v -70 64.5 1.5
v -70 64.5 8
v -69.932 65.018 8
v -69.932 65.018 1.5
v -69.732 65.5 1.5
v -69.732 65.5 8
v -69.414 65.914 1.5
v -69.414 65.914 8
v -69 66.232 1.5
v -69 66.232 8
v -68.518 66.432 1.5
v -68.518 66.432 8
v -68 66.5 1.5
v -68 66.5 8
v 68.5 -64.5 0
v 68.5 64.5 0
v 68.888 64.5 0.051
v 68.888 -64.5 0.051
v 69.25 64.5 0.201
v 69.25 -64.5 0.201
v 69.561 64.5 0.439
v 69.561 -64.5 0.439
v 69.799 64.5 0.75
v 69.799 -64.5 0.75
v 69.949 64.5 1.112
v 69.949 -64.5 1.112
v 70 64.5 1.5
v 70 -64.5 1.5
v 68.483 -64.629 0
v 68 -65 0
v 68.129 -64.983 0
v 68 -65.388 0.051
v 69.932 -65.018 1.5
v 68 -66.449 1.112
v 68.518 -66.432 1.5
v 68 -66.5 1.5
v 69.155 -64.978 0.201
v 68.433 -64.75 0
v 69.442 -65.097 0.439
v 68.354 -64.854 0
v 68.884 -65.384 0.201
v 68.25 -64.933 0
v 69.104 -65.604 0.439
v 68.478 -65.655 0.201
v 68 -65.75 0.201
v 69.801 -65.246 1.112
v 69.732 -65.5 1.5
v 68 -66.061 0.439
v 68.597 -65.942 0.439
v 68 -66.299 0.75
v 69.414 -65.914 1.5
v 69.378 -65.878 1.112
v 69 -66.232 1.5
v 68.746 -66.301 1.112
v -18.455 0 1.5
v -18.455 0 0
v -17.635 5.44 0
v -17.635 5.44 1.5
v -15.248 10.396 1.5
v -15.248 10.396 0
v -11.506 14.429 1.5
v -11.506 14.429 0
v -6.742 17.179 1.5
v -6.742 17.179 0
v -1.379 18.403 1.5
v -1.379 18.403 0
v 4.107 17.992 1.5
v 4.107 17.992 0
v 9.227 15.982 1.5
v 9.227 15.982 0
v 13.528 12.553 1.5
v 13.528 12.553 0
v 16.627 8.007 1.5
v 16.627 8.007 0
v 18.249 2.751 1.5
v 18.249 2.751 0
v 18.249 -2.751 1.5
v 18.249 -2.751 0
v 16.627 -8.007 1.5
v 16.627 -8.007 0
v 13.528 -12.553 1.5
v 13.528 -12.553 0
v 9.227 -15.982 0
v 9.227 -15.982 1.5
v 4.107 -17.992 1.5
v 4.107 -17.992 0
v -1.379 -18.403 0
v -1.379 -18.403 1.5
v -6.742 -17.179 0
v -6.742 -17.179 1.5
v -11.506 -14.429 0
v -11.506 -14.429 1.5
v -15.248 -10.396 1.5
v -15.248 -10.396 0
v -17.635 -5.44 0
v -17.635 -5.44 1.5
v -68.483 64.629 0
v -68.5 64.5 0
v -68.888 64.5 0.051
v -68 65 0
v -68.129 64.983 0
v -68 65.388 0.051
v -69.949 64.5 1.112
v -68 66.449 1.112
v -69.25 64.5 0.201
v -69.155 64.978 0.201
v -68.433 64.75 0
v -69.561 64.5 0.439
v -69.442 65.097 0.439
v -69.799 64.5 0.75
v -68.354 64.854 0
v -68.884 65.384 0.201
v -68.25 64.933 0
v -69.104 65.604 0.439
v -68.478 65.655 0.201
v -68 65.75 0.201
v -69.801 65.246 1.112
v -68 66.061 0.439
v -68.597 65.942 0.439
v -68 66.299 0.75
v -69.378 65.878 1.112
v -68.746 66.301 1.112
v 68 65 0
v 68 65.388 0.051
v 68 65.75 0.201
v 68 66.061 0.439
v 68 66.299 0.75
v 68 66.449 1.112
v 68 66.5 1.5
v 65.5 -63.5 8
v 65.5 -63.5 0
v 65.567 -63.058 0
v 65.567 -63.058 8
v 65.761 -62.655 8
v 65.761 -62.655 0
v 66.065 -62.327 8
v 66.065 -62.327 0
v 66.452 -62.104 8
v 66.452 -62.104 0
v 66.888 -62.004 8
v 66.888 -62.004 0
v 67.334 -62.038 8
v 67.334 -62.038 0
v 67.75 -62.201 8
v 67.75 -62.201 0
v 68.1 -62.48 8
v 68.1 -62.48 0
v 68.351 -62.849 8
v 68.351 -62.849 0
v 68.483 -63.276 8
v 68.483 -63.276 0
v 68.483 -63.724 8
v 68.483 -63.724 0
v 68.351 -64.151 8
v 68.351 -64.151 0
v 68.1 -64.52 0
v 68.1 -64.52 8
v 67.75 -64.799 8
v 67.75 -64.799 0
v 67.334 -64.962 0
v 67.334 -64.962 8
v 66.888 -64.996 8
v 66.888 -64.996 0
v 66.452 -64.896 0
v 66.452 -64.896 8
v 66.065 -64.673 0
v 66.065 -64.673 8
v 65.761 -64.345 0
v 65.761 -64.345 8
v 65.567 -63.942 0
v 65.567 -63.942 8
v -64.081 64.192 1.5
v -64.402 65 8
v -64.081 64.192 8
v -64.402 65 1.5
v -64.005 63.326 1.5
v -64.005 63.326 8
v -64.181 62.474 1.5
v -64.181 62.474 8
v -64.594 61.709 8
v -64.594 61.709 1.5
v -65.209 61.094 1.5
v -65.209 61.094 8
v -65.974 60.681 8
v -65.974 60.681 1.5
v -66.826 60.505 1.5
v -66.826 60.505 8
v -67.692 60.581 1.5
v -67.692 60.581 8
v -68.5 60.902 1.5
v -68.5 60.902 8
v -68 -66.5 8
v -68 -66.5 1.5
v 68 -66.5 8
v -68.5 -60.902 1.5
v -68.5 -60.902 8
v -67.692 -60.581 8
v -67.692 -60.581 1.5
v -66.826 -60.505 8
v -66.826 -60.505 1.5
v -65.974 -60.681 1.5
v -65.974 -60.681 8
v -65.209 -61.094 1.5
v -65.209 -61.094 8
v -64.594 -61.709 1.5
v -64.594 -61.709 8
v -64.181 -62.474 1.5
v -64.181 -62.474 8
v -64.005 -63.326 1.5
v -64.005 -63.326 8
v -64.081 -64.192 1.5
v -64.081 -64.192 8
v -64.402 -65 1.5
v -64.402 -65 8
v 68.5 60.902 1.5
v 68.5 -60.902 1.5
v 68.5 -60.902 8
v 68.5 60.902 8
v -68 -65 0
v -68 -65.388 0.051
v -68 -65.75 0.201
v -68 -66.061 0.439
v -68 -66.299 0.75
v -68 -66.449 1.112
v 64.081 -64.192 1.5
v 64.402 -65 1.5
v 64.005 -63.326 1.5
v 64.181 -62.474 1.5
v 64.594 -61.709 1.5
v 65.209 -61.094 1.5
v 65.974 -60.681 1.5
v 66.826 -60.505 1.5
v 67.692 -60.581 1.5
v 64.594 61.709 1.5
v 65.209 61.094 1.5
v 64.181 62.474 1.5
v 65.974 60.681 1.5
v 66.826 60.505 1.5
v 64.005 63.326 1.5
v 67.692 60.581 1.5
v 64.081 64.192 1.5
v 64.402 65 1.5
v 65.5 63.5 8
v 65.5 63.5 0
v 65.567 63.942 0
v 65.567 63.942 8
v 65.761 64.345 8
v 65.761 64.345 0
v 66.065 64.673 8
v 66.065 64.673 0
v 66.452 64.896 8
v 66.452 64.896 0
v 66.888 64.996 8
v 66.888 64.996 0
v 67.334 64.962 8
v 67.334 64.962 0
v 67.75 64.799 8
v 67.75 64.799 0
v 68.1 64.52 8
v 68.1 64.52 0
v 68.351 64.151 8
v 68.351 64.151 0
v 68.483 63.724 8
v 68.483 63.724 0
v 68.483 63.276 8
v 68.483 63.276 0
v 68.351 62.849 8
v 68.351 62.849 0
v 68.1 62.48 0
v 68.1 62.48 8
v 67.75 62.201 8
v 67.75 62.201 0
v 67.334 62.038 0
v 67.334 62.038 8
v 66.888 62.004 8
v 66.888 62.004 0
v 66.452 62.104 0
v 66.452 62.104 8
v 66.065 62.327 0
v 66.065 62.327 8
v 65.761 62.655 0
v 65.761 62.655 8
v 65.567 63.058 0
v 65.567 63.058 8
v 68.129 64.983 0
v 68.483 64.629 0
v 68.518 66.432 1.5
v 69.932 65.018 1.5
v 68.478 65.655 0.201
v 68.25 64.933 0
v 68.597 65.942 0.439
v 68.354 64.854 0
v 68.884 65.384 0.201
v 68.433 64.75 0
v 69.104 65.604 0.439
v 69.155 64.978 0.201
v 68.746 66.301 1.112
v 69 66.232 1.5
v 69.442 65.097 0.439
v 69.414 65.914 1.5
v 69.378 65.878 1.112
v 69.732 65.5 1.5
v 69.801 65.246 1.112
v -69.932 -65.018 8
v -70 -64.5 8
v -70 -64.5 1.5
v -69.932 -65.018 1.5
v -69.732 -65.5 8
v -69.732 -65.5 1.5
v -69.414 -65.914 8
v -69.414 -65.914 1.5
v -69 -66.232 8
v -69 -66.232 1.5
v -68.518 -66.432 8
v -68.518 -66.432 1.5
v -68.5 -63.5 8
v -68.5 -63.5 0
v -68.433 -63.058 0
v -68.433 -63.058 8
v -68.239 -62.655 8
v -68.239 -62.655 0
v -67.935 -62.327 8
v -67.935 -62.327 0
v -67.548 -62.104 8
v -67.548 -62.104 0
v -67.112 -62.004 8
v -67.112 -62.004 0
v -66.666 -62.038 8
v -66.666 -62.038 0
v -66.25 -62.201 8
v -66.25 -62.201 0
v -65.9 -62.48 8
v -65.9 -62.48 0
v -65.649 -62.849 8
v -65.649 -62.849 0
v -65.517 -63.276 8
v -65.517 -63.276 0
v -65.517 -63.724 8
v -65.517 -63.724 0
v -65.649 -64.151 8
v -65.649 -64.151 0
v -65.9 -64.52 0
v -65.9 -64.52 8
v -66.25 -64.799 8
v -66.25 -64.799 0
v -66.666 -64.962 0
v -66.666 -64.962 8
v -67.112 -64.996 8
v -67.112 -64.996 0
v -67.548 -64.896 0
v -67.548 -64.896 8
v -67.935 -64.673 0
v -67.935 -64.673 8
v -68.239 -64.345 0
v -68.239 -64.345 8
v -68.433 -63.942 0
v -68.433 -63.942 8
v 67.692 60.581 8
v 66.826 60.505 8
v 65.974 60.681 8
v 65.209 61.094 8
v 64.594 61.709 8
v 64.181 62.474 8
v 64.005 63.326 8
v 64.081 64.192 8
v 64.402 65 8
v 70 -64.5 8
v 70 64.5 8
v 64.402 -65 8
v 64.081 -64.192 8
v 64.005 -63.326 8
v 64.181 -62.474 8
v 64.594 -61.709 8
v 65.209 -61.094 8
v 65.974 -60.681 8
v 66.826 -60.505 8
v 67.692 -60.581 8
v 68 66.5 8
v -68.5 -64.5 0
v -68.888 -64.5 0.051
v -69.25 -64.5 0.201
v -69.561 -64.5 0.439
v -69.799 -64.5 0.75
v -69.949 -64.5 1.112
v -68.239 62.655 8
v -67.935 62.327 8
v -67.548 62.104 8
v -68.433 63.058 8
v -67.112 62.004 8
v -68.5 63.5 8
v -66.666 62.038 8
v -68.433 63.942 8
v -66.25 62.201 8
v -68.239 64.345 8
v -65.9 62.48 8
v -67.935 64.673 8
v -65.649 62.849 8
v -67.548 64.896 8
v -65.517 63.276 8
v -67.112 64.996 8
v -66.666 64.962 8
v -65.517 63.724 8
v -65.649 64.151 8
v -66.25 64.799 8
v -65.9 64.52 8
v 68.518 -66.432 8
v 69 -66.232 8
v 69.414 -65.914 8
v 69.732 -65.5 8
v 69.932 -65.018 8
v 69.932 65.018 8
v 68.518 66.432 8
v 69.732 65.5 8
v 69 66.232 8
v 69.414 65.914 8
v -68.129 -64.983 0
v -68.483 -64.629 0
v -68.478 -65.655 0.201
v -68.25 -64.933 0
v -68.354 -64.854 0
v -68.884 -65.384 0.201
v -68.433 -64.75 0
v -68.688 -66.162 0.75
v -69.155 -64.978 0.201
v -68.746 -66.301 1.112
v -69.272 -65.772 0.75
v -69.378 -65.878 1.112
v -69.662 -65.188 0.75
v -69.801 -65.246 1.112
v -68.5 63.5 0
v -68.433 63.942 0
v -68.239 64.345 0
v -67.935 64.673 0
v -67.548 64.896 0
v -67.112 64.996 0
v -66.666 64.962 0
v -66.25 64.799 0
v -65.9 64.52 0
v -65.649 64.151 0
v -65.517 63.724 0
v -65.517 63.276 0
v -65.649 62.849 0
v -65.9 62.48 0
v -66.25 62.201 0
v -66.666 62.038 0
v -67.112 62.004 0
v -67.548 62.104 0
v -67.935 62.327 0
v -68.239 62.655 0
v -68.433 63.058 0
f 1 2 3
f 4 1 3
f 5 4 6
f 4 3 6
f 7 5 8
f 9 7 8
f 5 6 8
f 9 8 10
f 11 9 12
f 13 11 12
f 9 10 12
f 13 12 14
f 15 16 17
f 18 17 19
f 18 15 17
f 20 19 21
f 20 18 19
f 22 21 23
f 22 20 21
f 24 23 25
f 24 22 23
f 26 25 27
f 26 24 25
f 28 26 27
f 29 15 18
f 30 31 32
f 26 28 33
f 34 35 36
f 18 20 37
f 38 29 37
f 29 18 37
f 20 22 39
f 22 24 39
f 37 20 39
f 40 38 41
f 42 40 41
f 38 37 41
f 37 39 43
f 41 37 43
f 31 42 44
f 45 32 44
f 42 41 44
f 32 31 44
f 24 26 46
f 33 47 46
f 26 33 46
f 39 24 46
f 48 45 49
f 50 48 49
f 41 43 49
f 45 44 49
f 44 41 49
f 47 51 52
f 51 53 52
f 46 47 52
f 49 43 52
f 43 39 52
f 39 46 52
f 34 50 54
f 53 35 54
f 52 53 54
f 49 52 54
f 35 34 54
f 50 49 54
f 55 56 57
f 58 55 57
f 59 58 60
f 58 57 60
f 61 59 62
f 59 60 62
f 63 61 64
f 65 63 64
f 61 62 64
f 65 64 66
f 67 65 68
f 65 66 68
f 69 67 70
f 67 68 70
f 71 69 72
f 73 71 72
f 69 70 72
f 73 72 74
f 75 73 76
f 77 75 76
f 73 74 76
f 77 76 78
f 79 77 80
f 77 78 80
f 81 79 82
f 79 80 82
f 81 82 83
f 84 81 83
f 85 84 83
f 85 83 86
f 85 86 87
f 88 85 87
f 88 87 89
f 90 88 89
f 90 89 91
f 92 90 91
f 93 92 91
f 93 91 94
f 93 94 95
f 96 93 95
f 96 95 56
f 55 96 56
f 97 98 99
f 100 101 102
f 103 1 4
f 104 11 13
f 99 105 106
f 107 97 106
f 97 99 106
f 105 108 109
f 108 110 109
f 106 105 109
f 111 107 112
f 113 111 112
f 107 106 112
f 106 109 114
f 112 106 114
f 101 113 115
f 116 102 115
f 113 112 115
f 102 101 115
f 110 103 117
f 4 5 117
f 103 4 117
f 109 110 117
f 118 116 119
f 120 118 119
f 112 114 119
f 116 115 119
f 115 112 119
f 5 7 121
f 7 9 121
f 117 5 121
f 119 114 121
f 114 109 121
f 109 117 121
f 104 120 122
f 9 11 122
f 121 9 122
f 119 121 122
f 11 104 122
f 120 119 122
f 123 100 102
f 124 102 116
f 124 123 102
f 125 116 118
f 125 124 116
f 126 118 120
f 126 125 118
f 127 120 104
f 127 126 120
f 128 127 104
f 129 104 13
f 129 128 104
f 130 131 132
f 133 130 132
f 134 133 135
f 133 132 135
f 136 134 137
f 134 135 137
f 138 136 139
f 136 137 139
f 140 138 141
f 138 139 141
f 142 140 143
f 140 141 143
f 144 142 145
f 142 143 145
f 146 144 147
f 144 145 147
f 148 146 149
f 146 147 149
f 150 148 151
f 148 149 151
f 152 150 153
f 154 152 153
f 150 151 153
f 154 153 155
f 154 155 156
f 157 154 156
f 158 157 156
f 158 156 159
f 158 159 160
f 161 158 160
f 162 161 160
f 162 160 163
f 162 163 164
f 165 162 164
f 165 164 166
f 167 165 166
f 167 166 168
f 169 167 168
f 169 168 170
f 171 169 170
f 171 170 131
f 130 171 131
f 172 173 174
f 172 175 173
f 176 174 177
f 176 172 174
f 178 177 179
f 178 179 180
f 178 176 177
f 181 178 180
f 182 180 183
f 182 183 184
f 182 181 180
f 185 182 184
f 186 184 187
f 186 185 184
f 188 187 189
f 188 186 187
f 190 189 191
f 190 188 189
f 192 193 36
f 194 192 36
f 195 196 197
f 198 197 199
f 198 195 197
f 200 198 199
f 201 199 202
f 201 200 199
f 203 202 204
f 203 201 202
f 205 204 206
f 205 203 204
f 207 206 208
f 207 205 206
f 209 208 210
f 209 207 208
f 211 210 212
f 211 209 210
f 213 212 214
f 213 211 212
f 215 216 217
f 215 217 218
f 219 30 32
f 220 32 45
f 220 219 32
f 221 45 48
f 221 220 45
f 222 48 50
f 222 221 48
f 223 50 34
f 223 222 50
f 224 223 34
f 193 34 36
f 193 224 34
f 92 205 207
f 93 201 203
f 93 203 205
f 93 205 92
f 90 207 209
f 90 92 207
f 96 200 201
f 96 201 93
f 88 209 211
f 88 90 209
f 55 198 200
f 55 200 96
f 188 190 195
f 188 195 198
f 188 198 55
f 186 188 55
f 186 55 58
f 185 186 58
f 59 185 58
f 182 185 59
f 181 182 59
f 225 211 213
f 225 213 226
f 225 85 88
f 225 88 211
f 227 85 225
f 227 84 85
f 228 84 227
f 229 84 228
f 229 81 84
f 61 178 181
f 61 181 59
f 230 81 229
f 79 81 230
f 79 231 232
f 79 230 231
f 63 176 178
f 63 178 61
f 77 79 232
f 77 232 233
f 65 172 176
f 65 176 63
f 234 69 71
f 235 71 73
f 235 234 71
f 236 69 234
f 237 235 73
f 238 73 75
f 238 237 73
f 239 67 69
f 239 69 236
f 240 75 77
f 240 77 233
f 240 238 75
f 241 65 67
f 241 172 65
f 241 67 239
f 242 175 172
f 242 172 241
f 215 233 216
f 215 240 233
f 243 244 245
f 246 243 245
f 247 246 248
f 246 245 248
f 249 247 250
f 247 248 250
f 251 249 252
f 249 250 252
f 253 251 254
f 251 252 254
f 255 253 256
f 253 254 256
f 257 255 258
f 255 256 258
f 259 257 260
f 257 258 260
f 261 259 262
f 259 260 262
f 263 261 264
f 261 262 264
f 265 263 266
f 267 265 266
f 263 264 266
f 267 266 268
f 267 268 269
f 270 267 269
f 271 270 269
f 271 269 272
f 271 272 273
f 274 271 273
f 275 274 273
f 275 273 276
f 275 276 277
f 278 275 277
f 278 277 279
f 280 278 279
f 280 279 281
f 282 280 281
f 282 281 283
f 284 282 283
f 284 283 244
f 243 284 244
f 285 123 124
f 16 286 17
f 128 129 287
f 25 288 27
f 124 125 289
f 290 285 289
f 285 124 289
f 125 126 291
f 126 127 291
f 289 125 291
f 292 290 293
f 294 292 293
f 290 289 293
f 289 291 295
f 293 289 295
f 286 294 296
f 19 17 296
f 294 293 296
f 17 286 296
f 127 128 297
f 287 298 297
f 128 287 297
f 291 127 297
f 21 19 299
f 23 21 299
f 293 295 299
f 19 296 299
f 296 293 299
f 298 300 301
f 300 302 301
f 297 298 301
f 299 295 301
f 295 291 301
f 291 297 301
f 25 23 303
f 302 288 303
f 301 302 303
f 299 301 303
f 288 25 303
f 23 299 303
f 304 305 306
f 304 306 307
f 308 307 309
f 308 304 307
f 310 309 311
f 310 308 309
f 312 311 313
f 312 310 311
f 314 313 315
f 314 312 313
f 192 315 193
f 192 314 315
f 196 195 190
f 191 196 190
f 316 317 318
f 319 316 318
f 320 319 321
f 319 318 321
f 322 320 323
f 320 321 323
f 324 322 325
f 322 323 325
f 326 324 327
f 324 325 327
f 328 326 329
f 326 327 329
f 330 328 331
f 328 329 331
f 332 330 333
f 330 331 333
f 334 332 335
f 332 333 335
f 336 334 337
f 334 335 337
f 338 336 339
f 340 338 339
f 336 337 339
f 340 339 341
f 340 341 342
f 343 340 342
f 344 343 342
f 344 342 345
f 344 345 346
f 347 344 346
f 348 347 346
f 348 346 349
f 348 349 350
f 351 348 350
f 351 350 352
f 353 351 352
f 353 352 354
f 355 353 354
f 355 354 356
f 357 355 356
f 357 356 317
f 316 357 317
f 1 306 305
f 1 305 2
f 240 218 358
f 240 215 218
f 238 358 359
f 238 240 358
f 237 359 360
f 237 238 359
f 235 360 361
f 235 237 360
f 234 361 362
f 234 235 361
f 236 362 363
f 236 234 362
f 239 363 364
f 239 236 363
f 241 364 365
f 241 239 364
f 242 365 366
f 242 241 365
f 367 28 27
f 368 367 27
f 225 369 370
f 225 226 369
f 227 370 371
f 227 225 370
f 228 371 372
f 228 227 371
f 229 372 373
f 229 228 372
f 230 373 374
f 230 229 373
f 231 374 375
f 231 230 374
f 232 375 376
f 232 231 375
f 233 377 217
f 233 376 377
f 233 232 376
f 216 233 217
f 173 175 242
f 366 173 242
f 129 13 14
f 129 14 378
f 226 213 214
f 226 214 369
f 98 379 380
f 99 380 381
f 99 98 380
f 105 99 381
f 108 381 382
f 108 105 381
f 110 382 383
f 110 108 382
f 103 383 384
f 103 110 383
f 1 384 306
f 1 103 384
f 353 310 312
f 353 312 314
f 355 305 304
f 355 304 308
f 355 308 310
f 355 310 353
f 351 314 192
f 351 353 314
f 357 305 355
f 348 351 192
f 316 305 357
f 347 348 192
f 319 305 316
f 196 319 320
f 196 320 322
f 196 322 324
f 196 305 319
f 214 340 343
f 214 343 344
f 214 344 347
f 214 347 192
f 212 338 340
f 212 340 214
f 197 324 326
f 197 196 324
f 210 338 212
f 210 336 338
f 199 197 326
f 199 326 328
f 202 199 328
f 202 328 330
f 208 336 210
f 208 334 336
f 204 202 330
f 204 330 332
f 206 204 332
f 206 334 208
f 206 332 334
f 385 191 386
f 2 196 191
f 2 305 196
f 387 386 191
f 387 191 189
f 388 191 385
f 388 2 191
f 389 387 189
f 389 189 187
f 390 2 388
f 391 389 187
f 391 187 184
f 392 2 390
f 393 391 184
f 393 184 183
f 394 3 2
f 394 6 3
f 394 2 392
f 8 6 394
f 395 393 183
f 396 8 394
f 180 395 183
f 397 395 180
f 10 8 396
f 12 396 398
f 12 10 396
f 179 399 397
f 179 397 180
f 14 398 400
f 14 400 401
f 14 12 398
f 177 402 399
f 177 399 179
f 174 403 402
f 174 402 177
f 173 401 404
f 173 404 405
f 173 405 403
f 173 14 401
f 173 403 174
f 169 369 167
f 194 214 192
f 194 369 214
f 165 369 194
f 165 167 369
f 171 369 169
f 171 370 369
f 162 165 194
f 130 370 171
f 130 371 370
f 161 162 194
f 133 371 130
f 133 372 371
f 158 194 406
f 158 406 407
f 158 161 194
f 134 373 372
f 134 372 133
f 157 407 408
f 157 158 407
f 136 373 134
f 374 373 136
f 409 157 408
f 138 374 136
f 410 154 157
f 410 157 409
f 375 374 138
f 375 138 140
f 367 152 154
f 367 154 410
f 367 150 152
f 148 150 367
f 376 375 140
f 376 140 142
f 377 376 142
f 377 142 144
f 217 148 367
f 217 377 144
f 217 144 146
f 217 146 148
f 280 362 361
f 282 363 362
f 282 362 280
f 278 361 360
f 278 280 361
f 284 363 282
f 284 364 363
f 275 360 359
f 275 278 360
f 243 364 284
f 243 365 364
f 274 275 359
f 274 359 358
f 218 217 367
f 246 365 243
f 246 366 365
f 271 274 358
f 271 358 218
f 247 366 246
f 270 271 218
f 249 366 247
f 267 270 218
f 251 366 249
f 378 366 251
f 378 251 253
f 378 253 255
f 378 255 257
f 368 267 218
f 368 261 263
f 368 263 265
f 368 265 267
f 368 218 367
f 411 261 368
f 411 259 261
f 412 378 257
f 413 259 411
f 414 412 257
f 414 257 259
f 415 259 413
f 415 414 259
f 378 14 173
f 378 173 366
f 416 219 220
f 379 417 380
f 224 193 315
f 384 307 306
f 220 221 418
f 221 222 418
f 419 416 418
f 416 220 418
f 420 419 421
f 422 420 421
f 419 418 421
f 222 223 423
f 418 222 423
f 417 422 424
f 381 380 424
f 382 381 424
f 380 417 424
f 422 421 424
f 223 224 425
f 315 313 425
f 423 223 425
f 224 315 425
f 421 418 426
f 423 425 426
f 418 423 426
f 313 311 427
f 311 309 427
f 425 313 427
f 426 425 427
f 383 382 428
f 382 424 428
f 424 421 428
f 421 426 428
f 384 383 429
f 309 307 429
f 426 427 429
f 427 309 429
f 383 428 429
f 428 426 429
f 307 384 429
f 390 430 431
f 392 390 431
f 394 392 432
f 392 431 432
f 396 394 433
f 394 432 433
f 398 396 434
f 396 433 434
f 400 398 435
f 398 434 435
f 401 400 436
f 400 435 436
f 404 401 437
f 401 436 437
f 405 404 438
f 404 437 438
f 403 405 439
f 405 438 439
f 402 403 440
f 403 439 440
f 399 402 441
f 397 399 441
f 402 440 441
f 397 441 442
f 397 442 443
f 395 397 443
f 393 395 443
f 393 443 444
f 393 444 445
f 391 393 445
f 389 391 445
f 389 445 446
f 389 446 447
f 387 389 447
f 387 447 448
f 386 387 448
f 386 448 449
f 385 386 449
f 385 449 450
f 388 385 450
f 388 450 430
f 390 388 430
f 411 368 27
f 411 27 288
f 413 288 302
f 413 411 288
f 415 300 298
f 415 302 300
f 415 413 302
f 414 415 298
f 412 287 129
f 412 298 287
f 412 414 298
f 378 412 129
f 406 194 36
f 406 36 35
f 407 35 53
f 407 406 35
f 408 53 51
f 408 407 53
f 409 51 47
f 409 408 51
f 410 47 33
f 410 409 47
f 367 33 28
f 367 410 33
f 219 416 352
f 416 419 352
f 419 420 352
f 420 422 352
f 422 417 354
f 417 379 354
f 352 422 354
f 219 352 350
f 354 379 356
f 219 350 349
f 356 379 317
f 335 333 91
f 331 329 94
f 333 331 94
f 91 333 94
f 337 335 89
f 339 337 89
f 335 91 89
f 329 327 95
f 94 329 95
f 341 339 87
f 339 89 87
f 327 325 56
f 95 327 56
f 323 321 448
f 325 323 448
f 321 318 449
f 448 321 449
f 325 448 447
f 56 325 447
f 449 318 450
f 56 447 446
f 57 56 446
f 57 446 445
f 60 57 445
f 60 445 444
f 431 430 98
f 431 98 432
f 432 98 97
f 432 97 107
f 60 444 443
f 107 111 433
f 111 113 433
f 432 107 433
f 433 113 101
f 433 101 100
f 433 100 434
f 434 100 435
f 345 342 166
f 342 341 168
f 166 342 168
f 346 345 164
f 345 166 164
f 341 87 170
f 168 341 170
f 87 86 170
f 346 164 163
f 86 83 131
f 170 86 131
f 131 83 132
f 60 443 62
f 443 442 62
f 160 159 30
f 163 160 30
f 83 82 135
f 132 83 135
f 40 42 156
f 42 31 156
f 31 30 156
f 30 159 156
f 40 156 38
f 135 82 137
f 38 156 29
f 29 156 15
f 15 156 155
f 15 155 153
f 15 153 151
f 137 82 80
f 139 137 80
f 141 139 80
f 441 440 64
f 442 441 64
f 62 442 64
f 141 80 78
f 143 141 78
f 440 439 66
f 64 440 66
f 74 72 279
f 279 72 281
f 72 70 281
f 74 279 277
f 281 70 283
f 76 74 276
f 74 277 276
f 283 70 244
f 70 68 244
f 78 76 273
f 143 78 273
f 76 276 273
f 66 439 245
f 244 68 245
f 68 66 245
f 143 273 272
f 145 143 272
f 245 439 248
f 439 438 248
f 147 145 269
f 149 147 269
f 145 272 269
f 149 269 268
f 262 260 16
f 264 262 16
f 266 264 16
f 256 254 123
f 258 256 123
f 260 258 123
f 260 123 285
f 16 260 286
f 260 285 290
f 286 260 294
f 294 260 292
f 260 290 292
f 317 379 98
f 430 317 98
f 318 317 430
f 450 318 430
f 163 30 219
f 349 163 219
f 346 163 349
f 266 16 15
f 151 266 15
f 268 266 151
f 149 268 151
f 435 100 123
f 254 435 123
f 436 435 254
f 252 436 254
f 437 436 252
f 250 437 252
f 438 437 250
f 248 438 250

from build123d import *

# Parameters (mm, degrees)
SKETCH1_W                = 140
SKETCH1_H                = 133
BOSS_EXTRUDE1_DEPTH      = 8
F_3_0_3_DIAMETER_HOLE1_D = 3
SHELL3_T                 = -1.5
FILLET2_R                = 2
FILLET3_R                = 2
FILLET4_R                = 2
FILLET5_R                = 2
SKETCH13_R               = 18.454910332
CUT_EXTRUDE1_DEPTH       = 10
FILLET6_R                = 1.5


with BuildPart() as part:
    # Sketch1 → Boss-Extrude1 (new body)
    with BuildSketch(Plane.XY):
        Rectangle(SKETCH1_W, SKETCH1_H)
    extrude(amount=BOSS_EXTRUDE1_DEPTH)

    # Ø3.0 (3) Diameter Hole1 (through all)
    with Locations(Plane.XY.offset(8)):
        with Locations((-67, 63.5), (67, 63.5), (-67, -63.5), (67, -63.5)):
            Hole(F_3_0_3_DIAMETER_HOLE1_D / 2)

    # Shell3
    shell3_openings = [part.faces().sort_by_distance(p)[0] for p in [
        (0, 0, 8),
    ]]
    offset(amount=SHELL3_T, openings=shell3_openings)

    # Fillet2
    fillet2_edges = [part.edges().sort_by_distance(p)[0] for p in [
        (-70, 66.5, 4),
    ]]
    fillet(fillet2_edges, radius=FILLET2_R)

    # Fillet3
    fillet3_edges = [part.edges().sort_by_distance(p)[0] for p in [
        (-70, -66.5, 4),
    ]]
    fillet(fillet3_edges, radius=FILLET3_R)

    # Fillet4
    fillet4_edges = [part.edges().sort_by_distance(p)[0] for p in [
        (70, -66.5, 4),
    ]]
    fillet(fillet4_edges, radius=FILLET4_R)

    # Fillet5
    fillet5_edges = [part.edges().sort_by_distance(p)[0] for p in [
        (70, 66.5, 4),
    ]]
    fillet(fillet5_edges, radius=FILLET5_R)

    # Sketch13 → Cut-Extrude1 (cut)
    with BuildSketch(Plane(origin=(0, 0, 0), x_dir=(-1, 0, 0), z_dir=(0, 0, -1))):
        Circle(SKETCH13_R)
    extrude(amount=-CUT_EXTRUDE1_DEPTH, mode=Mode.SUBTRACT)

    # Fillet6
    fillet6_edges = [part.edges().sort_by_distance(p)[0] for p in [
        (-70, 0, 0),
        (-69.414213562, 65.914213562, 0),
        (0, -66.5, 0),
        (-69.414213562, -65.914213562, 0),
        (70, 0, 0),
        (69.414213562, -65.914213562, 0),
        (0, 66.5, 0),
        (69.414213562, 65.914213562, 0),
    ]]
    fillet(fillet6_edges, radius=FILLET6_R - 0.0001)  # a hair under: the kernel refuses the full size


solid = part.part
